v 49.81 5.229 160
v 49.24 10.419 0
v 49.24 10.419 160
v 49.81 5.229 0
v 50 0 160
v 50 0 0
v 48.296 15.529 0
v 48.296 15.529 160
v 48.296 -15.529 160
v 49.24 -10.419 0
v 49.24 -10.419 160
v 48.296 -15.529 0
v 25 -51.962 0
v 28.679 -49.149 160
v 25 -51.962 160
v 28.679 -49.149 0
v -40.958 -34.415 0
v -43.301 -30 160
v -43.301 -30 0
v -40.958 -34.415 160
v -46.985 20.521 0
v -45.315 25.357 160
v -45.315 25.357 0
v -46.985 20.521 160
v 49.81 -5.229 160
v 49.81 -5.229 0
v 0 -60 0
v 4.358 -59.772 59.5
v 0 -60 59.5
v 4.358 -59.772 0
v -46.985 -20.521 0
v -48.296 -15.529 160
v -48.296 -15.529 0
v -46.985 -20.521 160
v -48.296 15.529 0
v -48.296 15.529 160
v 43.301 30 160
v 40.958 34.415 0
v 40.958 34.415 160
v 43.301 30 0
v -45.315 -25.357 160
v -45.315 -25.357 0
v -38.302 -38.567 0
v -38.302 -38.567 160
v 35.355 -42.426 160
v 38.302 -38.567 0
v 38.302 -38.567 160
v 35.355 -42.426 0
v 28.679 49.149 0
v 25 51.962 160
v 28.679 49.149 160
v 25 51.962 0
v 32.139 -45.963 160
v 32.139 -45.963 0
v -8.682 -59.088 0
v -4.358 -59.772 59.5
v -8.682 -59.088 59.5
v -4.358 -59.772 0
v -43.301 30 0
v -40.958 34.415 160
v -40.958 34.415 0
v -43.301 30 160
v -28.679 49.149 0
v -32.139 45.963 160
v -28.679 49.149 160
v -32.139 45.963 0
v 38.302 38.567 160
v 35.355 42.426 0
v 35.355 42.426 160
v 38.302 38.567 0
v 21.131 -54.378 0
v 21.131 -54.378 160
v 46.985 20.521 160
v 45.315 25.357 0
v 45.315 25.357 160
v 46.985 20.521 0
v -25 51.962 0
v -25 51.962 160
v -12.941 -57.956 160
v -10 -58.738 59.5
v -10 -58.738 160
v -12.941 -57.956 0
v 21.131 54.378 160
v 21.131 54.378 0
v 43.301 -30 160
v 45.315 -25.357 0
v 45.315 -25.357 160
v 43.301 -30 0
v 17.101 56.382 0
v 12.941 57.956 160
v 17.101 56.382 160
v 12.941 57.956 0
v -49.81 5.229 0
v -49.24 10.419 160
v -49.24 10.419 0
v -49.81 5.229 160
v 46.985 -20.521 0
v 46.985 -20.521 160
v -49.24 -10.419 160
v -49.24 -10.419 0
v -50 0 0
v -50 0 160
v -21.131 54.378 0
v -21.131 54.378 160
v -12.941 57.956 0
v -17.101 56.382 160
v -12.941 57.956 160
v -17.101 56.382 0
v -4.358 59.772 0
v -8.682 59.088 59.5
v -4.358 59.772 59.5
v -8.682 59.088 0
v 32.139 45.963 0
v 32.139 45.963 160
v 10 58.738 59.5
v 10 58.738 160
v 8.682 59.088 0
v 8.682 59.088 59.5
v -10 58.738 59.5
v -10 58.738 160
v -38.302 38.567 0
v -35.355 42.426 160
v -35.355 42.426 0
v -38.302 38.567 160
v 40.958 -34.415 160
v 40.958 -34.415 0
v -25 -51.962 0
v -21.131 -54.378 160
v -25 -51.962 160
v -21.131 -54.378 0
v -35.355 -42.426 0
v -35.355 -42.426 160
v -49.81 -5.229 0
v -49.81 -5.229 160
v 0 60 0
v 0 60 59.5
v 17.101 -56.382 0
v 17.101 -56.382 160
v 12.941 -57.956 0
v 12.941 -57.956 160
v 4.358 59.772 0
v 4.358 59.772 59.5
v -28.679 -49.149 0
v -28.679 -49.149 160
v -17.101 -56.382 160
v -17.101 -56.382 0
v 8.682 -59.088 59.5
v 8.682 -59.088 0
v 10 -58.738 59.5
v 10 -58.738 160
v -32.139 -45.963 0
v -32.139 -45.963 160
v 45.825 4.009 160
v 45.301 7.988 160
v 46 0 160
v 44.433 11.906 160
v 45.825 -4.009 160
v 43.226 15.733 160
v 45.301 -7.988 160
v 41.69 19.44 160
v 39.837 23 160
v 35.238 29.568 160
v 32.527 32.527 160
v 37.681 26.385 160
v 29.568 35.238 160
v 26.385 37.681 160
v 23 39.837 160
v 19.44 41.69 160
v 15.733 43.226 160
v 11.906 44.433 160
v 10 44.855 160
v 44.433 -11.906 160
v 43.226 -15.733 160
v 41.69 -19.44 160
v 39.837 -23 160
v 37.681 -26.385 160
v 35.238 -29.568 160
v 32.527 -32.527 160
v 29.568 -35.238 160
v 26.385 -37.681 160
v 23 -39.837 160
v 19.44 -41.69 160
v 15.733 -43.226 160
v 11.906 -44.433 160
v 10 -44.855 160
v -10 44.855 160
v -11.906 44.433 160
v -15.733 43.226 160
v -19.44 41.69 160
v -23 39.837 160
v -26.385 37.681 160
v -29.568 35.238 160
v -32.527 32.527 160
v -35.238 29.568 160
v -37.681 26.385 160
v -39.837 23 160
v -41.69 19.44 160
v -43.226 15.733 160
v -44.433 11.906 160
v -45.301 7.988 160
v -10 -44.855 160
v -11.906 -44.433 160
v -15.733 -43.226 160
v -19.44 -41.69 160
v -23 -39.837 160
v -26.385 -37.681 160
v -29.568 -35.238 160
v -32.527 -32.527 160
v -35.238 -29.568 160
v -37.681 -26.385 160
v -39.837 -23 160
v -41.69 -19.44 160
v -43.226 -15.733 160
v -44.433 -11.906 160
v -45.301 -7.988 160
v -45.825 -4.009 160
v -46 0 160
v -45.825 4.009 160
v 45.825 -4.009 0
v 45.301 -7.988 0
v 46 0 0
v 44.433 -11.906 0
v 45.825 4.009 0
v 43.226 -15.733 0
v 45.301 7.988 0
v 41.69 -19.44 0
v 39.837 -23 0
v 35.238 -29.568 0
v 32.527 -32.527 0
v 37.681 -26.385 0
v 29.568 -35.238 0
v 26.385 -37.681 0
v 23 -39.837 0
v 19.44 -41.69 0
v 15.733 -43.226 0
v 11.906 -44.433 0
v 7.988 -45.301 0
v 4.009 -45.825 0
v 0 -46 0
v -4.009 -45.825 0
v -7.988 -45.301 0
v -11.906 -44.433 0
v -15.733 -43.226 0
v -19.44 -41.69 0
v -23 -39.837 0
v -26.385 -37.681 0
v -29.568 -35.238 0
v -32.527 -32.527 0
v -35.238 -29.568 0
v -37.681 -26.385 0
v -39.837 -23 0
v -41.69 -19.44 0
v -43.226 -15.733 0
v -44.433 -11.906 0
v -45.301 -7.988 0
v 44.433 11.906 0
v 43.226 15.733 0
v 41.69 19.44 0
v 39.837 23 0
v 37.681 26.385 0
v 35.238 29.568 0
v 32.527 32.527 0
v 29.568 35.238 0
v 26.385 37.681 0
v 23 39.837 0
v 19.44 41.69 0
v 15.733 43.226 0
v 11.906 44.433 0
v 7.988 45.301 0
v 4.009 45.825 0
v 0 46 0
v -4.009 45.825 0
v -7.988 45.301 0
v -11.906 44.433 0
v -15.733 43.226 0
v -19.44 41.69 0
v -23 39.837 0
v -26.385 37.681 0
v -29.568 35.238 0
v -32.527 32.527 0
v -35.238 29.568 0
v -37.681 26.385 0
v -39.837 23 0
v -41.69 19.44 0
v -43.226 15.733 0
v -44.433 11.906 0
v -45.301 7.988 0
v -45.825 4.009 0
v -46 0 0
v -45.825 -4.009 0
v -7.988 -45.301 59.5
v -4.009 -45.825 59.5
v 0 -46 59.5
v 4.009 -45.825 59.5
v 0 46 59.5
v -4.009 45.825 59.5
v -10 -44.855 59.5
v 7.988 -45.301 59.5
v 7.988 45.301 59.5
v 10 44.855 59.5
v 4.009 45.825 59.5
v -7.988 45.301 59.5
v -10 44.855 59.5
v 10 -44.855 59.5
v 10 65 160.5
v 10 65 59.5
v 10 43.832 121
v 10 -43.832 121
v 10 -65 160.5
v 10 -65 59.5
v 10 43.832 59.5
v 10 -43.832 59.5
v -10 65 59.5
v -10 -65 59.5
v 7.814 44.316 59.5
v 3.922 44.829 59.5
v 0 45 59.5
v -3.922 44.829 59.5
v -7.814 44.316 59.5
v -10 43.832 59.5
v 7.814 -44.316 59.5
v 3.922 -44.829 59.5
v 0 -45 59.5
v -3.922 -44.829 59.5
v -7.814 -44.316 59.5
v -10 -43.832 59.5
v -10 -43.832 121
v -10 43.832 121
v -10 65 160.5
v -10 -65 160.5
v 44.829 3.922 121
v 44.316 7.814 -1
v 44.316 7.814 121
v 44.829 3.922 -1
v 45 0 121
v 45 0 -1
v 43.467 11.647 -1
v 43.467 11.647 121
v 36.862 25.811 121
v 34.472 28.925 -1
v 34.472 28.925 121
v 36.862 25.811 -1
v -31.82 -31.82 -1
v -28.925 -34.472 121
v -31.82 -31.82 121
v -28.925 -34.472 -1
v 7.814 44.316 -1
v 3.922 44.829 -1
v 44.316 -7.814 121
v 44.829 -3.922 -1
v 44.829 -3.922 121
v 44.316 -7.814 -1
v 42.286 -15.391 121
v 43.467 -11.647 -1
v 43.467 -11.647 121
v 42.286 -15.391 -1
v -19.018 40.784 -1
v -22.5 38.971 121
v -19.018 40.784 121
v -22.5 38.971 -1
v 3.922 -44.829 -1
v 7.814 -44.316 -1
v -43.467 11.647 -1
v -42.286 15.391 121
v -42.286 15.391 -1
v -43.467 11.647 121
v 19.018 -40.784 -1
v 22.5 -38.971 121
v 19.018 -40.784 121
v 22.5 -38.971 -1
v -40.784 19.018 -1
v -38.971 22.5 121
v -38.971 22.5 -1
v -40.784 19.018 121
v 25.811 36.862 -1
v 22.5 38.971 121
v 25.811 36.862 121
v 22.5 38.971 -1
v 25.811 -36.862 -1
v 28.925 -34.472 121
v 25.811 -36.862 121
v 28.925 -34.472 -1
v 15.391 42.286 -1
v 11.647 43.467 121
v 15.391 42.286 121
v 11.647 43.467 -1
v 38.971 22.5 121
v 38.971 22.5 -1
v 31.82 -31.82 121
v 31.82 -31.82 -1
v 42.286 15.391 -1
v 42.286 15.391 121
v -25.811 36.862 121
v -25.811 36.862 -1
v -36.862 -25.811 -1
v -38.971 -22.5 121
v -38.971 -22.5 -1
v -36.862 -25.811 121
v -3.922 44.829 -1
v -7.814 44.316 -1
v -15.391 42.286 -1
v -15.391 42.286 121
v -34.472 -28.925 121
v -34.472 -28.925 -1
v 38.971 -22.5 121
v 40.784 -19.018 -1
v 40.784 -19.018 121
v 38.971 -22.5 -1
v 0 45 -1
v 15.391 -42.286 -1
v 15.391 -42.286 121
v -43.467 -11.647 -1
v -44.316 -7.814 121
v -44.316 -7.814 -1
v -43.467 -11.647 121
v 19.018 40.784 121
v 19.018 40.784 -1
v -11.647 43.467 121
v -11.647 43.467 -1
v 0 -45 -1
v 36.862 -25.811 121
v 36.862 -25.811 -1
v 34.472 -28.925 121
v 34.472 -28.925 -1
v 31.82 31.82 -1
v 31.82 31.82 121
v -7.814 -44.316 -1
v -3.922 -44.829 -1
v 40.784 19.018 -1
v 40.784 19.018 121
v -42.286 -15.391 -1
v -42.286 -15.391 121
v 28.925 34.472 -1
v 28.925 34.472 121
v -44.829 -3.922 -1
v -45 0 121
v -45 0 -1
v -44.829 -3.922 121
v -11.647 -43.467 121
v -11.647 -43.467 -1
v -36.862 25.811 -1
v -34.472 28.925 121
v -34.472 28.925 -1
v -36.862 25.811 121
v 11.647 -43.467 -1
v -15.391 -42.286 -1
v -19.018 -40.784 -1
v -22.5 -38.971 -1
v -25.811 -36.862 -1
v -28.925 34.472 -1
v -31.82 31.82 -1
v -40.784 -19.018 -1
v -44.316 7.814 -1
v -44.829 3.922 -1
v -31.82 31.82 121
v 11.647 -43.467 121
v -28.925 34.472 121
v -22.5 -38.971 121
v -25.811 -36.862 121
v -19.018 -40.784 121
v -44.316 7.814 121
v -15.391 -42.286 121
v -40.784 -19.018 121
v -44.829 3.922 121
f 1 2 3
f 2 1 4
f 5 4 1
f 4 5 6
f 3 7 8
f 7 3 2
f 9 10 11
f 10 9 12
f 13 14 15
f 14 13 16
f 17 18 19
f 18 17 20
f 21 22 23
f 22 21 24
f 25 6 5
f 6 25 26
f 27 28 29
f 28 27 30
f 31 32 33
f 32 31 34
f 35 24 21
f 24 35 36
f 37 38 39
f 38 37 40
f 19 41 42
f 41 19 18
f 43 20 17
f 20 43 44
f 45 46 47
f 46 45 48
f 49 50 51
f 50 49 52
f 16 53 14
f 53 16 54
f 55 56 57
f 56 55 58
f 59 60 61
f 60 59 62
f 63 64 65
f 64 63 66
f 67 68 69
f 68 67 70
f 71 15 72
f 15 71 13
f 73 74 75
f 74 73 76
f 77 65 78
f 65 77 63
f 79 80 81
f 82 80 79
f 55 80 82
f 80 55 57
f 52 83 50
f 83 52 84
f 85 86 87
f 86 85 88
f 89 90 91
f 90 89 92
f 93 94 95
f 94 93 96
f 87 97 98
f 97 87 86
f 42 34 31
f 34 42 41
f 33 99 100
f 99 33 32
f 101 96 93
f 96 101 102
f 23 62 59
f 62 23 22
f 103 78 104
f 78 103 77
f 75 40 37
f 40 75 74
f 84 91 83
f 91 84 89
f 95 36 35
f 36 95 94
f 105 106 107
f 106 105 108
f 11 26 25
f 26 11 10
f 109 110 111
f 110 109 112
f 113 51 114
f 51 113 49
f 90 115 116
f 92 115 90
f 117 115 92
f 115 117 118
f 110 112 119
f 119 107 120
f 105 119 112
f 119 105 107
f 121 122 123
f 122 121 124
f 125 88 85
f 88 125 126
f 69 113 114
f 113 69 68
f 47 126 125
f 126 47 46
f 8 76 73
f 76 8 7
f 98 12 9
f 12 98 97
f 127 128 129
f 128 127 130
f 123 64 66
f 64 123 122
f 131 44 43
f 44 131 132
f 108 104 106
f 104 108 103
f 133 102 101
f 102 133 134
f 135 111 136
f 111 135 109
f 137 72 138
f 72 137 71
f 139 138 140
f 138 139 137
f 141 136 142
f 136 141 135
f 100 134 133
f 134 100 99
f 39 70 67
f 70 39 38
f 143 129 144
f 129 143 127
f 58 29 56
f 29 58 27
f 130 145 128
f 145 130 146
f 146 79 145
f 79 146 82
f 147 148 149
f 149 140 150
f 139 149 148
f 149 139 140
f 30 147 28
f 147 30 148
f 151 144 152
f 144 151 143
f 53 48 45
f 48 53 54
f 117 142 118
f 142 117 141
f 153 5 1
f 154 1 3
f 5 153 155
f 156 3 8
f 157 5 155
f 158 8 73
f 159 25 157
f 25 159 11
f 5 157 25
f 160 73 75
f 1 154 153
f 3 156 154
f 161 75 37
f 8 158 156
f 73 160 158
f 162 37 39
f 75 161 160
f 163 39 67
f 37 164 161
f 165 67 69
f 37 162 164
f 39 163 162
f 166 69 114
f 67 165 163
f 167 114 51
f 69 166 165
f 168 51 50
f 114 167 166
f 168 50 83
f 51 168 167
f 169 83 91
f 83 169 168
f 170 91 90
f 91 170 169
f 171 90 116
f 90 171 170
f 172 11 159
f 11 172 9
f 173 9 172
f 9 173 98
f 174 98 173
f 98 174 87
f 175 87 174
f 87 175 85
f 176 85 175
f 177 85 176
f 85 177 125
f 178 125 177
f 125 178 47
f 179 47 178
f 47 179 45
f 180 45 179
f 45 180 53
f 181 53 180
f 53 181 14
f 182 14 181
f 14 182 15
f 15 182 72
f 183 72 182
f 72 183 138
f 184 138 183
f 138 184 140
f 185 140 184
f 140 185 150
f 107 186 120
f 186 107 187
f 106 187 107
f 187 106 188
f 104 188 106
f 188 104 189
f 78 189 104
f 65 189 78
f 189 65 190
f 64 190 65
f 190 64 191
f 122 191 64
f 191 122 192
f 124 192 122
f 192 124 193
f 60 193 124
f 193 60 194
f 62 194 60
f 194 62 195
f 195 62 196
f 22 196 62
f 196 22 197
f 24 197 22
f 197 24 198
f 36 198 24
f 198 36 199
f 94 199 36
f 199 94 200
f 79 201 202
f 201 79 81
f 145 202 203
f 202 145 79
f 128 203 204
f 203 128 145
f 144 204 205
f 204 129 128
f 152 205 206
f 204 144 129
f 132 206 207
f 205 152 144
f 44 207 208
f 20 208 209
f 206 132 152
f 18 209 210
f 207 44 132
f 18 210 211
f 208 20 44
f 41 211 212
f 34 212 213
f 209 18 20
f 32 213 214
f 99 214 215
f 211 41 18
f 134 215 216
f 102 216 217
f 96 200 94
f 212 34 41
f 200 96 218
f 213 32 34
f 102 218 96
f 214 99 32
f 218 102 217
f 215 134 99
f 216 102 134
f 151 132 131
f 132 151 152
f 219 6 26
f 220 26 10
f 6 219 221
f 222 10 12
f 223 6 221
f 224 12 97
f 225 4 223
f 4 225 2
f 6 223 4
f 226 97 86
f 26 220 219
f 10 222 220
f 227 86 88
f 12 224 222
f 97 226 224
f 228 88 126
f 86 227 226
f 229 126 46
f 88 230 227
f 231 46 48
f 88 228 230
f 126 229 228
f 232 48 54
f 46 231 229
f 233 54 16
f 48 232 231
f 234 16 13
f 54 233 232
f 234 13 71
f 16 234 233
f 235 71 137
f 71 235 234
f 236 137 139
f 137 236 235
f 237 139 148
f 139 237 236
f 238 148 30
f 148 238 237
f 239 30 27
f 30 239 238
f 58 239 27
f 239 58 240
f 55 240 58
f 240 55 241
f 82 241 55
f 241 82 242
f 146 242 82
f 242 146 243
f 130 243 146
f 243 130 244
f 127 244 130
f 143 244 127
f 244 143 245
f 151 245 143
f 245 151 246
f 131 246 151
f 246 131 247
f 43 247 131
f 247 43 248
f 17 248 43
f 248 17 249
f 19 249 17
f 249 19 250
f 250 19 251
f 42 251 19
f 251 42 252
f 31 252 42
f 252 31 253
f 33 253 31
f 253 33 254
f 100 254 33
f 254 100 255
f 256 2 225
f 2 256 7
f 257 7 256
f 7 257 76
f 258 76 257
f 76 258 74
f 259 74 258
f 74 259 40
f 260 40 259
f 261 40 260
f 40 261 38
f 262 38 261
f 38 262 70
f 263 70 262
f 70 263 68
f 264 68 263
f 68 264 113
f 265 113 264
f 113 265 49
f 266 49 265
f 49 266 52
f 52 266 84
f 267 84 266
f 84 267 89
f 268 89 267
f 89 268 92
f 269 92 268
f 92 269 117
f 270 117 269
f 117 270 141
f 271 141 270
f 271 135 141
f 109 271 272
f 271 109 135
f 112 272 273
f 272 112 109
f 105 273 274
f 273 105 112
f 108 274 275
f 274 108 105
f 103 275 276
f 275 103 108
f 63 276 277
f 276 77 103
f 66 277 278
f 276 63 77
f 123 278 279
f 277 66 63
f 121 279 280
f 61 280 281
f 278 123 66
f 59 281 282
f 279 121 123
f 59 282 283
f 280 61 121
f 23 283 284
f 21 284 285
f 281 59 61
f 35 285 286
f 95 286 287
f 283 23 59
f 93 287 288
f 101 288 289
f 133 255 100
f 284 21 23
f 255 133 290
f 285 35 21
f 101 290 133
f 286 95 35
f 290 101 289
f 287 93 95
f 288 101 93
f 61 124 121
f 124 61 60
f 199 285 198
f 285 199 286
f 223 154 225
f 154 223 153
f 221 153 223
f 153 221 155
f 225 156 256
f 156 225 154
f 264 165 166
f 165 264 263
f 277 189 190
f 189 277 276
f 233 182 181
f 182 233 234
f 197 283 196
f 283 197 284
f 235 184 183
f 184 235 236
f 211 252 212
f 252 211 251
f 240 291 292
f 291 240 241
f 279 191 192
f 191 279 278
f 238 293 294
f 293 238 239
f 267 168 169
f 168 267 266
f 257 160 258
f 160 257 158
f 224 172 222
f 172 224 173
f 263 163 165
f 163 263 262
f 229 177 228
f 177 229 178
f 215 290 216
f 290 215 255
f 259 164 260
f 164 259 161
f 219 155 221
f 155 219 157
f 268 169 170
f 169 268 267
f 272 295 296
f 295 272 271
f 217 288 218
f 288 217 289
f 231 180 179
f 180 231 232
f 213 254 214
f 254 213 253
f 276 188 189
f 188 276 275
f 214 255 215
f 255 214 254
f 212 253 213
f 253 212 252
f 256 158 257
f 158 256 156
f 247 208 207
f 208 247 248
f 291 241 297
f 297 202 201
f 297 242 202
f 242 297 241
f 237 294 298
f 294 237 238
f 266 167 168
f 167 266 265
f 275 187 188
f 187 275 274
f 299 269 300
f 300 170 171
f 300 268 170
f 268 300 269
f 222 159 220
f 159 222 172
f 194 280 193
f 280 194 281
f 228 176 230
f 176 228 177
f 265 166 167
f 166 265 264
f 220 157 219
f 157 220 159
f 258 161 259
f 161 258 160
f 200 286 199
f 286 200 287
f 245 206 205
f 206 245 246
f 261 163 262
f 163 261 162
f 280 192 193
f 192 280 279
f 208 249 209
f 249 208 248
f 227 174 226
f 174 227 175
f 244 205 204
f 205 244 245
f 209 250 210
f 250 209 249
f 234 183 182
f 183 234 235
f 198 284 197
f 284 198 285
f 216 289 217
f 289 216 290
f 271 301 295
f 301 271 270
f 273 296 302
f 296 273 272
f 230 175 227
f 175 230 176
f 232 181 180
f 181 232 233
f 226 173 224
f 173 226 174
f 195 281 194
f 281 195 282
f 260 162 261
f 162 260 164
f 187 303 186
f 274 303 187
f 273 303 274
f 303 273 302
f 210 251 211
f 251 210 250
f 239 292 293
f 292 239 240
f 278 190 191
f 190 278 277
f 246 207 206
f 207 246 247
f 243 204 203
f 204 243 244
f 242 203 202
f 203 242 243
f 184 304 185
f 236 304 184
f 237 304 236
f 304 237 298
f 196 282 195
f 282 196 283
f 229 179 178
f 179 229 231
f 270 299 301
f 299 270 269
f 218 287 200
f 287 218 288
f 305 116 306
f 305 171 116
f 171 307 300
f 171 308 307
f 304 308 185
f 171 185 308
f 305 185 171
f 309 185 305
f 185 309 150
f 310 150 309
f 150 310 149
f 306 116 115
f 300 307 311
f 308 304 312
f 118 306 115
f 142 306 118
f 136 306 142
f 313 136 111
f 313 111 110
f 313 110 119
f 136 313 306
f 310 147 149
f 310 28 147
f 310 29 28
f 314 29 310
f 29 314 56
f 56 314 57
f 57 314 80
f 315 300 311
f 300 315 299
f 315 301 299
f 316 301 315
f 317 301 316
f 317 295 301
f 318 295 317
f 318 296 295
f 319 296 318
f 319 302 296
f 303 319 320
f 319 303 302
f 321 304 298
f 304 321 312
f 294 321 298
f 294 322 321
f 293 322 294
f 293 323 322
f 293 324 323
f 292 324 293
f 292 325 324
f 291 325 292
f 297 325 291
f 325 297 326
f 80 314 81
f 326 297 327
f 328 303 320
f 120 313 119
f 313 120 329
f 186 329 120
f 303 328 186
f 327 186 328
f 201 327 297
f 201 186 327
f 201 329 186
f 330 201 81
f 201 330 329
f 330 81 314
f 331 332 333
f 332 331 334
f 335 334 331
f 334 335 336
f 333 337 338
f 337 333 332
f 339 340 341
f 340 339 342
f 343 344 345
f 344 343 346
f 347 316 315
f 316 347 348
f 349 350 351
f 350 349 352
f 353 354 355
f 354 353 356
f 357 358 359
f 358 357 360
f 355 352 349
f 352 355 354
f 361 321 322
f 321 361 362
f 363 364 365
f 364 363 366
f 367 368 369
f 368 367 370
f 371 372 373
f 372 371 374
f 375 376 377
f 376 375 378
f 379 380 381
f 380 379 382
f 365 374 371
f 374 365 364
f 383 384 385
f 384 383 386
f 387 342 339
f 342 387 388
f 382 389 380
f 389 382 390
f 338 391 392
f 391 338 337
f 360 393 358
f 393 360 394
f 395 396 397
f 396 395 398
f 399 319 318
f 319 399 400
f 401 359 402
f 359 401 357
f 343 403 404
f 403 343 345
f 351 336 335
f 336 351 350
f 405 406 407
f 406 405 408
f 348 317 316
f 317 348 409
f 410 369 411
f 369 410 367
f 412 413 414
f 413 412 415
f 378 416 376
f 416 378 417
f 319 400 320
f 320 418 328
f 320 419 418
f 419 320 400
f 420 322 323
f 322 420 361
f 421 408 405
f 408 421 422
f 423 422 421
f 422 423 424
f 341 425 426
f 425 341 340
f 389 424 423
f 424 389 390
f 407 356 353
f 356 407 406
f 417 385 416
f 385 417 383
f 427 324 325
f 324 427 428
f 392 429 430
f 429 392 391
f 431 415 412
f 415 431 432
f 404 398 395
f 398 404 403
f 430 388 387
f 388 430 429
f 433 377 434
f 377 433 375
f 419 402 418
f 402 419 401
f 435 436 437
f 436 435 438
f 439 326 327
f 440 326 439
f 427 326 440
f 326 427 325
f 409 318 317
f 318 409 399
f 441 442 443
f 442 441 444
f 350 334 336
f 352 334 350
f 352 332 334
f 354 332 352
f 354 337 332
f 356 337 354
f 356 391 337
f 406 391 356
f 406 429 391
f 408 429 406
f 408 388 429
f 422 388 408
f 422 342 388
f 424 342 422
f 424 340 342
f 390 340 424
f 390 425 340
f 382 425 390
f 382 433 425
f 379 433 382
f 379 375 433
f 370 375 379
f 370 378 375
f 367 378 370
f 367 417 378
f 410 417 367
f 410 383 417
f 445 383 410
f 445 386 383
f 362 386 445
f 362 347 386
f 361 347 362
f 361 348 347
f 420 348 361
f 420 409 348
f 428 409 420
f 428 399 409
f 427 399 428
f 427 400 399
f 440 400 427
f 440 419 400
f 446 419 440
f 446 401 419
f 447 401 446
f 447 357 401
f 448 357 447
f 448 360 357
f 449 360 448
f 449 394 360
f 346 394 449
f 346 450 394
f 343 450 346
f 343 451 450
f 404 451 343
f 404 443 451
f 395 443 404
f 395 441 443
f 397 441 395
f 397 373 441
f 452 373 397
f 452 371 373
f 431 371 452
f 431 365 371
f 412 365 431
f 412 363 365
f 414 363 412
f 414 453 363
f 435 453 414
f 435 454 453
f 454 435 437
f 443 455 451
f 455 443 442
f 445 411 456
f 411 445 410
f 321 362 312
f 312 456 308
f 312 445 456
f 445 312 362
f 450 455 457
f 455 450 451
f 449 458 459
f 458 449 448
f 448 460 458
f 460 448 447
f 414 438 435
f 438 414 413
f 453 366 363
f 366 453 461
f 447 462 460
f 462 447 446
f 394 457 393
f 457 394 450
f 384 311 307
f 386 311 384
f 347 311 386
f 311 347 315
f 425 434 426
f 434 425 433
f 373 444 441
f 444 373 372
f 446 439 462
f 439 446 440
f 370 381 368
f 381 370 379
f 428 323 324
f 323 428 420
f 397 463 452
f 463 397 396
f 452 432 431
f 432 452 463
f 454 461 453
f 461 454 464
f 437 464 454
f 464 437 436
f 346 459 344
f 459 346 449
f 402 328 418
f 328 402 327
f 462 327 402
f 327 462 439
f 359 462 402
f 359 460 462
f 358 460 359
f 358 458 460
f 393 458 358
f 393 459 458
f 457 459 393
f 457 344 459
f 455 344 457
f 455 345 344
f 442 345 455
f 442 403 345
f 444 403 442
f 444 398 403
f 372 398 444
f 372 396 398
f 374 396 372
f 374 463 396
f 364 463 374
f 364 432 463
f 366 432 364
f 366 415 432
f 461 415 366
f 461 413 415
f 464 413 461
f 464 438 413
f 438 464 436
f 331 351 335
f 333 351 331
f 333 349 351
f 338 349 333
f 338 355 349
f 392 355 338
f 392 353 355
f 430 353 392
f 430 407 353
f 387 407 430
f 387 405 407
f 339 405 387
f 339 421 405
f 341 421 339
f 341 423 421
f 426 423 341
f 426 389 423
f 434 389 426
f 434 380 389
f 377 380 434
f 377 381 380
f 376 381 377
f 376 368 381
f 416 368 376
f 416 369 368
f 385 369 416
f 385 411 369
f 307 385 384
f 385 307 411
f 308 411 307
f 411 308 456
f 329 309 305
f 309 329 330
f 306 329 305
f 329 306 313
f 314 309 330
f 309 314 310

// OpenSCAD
$fn=72;


// ================================
// DIFFERENCE
// ================================

module difference_part() {

    difference() {

        color("gray")
        scale([1,1.2,1])
        cylinder(160,50,50);

        color("gray")
        translate([0,0,-1])
        cylinder(162,46,46);

        color("gray")
        translate([0,0,120])
        cube([20,120,121],center=true);
    }
}


// ================================
// UNION / SEPARATOR
// ================================

module union_part() {

    union() {

        color("orange")
        translate([0,0,-1])
        cylinder(122,45,45);

        color("orange")
        translate([0,0,110])
        cube([20,130,101],center=true);
    }
}


// ================================
// ENABLE / DISABLE PARTS
// ================================

// Uncomment/comment these to turn parts on/off

difference_part();
union_part();
